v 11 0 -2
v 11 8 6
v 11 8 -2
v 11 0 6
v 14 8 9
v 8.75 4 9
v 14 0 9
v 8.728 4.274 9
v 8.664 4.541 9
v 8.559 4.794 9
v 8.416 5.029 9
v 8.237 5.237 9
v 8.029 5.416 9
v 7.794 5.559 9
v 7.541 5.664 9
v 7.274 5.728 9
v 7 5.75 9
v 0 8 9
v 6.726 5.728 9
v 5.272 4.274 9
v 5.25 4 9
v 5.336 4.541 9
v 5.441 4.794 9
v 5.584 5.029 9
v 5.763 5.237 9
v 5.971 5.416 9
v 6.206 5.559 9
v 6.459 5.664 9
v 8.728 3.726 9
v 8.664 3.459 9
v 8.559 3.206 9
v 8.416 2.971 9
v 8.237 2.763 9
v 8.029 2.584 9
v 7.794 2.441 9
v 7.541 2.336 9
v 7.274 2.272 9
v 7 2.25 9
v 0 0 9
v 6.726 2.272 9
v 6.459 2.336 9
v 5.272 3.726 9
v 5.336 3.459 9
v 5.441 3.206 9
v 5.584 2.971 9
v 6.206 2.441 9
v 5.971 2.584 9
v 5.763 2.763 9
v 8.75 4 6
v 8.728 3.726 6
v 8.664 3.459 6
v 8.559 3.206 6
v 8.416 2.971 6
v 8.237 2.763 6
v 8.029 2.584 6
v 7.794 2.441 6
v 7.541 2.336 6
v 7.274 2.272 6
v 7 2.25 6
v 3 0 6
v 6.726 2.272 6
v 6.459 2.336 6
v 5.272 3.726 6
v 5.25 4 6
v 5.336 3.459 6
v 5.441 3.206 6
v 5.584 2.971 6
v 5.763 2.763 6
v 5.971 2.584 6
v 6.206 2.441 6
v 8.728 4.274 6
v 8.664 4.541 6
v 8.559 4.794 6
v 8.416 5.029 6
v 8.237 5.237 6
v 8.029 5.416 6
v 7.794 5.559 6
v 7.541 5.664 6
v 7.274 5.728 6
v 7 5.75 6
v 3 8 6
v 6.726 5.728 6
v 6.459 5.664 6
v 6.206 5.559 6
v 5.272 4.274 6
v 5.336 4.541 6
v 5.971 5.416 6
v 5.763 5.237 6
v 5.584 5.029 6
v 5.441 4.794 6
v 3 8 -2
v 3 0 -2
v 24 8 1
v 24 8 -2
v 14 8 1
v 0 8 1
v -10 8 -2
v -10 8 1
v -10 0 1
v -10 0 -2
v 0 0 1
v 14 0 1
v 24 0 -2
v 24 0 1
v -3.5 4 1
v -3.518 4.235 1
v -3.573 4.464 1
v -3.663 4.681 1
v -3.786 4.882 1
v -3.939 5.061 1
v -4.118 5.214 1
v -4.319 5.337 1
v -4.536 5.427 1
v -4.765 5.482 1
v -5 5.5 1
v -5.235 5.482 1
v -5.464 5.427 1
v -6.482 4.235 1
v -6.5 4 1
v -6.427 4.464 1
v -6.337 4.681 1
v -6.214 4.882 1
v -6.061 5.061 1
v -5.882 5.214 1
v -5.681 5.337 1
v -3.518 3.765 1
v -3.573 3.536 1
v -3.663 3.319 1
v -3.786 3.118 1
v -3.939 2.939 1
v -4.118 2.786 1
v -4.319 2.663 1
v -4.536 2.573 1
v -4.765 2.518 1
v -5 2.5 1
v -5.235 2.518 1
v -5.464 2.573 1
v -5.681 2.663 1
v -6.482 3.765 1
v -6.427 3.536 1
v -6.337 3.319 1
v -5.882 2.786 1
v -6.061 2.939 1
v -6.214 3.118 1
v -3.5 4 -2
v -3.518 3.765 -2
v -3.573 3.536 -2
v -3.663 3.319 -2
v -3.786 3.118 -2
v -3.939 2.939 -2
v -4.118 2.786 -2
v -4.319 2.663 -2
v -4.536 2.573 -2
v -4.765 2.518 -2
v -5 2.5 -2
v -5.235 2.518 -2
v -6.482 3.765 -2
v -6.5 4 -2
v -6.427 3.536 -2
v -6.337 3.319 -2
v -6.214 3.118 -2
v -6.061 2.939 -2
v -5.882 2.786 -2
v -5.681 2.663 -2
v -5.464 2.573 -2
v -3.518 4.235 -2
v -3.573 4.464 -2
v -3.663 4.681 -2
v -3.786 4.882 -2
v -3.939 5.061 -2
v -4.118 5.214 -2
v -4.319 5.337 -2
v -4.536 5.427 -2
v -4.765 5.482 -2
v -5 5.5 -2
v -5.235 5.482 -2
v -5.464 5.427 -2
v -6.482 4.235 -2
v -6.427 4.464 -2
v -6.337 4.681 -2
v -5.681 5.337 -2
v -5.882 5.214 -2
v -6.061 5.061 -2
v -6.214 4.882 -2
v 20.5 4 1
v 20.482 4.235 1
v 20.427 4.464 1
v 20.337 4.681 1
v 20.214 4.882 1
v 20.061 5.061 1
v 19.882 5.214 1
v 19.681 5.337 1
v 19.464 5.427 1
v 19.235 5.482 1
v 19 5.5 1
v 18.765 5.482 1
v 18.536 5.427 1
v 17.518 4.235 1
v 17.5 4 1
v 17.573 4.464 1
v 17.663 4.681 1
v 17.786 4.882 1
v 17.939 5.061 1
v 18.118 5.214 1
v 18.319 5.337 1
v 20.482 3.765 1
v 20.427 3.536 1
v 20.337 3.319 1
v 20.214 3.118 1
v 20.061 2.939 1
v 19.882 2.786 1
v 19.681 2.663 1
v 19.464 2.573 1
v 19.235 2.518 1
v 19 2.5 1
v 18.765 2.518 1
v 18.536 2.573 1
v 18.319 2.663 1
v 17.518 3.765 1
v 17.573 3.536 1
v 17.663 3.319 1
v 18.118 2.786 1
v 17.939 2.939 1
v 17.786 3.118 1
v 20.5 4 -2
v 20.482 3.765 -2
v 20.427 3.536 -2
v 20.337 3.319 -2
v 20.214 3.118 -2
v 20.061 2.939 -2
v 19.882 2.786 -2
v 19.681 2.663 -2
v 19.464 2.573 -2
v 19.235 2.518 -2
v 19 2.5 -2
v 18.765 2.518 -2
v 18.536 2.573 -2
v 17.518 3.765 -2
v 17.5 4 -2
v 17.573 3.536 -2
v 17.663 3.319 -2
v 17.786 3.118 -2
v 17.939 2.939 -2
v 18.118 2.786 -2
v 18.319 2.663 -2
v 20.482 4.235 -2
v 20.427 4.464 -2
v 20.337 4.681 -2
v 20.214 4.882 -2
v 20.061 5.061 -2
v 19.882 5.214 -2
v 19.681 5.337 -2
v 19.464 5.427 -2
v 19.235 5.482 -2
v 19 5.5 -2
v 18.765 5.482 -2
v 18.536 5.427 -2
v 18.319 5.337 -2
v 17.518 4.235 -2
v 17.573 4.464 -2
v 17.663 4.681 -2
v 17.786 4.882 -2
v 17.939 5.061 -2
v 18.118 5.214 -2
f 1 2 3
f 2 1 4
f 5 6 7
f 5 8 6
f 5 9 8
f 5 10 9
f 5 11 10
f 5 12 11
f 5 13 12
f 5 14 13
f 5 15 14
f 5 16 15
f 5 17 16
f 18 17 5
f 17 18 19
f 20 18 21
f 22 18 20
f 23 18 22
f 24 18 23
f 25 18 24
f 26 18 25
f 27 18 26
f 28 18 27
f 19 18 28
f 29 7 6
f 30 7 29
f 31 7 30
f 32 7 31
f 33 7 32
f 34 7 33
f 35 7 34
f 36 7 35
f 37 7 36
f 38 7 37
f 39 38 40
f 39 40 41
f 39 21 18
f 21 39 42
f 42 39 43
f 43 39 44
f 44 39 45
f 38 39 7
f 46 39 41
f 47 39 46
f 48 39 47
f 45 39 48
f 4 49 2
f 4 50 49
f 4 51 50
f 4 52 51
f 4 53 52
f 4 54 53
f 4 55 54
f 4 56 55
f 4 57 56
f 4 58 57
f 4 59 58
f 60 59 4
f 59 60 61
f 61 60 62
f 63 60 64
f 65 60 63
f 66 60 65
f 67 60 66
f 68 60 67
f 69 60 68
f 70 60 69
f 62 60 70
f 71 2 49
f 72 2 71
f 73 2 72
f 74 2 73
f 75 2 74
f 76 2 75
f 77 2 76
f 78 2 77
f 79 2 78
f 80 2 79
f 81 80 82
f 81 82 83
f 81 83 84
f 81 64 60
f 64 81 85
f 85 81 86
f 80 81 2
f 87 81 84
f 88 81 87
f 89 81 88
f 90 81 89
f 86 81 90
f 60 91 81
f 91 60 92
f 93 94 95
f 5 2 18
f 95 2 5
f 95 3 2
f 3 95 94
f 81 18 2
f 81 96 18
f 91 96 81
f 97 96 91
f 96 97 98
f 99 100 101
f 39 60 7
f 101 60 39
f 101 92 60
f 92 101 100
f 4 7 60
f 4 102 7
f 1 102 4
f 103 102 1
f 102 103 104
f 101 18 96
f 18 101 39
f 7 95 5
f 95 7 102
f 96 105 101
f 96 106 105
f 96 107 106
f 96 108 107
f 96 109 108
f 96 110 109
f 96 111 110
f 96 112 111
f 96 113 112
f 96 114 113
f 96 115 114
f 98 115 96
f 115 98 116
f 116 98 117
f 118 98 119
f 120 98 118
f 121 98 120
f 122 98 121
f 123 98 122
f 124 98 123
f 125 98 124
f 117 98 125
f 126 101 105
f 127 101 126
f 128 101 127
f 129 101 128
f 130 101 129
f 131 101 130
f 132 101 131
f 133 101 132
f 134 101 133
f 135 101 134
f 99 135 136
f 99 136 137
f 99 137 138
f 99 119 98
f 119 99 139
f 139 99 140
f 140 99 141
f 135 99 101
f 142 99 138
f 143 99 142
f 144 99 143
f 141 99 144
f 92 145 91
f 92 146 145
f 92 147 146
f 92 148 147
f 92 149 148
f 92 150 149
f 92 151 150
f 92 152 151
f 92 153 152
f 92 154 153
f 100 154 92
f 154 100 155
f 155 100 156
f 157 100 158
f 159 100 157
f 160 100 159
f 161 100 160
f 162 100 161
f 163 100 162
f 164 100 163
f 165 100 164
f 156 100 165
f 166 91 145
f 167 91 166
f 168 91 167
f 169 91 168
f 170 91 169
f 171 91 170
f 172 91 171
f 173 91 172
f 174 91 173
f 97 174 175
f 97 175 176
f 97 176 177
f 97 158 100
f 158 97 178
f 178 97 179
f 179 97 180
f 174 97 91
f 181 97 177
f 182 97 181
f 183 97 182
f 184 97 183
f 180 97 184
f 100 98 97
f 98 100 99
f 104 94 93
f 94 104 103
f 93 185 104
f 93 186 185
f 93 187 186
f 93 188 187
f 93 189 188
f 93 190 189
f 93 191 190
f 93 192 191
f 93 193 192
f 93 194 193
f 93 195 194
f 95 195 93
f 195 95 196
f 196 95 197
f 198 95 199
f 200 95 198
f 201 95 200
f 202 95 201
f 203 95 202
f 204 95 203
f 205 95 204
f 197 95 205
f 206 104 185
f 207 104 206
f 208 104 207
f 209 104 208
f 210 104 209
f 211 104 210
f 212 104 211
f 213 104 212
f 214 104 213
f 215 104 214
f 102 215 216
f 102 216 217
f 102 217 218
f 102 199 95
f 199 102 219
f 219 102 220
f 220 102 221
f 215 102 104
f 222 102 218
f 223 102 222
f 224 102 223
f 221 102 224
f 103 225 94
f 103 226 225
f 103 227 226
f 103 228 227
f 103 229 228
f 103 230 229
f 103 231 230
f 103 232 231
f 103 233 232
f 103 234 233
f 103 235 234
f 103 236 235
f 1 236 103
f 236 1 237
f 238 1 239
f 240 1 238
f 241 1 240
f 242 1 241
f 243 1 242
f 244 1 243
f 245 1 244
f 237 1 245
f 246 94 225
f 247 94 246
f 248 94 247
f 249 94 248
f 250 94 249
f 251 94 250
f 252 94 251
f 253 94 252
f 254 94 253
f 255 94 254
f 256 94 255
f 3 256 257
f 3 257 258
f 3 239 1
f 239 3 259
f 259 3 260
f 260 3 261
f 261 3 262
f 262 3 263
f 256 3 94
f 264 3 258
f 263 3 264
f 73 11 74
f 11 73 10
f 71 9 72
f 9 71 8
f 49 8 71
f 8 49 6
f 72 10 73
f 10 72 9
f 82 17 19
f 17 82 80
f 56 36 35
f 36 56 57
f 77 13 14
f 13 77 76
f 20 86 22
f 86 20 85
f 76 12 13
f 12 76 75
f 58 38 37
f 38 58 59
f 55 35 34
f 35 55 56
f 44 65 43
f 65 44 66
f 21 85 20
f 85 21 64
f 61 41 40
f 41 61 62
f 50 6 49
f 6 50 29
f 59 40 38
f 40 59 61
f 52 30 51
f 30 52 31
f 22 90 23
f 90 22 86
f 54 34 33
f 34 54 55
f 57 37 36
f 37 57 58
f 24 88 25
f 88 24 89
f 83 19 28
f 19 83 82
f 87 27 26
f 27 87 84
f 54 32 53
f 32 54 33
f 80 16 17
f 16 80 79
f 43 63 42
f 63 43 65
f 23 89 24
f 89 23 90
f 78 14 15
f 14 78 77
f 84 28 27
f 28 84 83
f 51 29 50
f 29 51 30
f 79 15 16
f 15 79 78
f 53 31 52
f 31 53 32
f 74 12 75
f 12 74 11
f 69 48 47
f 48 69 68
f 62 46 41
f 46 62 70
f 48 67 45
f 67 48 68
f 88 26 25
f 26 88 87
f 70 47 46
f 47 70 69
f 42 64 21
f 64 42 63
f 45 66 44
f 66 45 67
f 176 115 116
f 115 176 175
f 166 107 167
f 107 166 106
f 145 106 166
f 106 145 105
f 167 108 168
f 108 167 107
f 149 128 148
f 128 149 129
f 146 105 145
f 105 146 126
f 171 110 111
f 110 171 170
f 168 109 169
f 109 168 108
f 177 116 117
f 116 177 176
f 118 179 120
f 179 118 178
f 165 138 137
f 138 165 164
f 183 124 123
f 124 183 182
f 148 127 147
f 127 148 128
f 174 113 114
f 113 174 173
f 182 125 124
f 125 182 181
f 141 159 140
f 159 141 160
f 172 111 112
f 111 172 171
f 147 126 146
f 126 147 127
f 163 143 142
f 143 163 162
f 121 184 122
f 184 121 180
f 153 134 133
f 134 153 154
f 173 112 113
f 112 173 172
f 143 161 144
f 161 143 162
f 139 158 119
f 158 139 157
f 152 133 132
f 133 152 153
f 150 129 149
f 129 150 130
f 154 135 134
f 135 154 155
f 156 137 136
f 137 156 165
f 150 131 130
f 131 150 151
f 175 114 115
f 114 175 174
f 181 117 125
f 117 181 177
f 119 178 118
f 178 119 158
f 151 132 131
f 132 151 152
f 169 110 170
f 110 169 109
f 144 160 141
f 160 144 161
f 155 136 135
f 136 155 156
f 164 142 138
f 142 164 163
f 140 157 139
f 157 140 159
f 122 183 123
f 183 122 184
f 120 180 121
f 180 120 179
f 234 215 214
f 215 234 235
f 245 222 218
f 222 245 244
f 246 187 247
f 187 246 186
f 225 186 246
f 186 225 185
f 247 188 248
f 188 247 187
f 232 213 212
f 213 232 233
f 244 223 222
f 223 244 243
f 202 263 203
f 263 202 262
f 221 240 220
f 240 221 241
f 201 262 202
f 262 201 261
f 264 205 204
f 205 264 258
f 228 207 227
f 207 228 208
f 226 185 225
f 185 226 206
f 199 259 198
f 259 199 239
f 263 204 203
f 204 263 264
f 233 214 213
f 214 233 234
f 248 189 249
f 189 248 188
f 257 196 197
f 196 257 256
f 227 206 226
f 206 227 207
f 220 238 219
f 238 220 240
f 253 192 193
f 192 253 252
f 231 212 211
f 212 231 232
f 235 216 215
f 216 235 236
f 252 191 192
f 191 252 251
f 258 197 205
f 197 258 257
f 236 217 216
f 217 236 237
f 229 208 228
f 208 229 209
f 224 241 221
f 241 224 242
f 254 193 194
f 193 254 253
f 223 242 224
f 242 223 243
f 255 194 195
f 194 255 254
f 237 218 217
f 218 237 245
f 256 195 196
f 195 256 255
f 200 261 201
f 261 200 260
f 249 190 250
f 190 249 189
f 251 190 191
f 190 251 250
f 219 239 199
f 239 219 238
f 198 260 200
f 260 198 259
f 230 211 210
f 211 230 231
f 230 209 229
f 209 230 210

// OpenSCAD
$fn = 40;

module support() {
    translate([3,0,6]) cube([8,8,3]);
    translate([0,0,0]) cube([3,8,9]);
    translate([11,0,0]) cube([3,8,9]);
    translate([-10,0,-2]) cube([13,8,3]);
    translate([11,0,-2]) cube([13,8,3]);
}

module supportfin() {
    difference(){
        support();
        translate([7,4,5]) cylinder(d=3.5, h=8);
        translate([-5,4,-3]) cylinder(d=3, h=8);
        translate([19,4,-3]) cylinder(d=3, h=8);
    }
}
supportfin();
